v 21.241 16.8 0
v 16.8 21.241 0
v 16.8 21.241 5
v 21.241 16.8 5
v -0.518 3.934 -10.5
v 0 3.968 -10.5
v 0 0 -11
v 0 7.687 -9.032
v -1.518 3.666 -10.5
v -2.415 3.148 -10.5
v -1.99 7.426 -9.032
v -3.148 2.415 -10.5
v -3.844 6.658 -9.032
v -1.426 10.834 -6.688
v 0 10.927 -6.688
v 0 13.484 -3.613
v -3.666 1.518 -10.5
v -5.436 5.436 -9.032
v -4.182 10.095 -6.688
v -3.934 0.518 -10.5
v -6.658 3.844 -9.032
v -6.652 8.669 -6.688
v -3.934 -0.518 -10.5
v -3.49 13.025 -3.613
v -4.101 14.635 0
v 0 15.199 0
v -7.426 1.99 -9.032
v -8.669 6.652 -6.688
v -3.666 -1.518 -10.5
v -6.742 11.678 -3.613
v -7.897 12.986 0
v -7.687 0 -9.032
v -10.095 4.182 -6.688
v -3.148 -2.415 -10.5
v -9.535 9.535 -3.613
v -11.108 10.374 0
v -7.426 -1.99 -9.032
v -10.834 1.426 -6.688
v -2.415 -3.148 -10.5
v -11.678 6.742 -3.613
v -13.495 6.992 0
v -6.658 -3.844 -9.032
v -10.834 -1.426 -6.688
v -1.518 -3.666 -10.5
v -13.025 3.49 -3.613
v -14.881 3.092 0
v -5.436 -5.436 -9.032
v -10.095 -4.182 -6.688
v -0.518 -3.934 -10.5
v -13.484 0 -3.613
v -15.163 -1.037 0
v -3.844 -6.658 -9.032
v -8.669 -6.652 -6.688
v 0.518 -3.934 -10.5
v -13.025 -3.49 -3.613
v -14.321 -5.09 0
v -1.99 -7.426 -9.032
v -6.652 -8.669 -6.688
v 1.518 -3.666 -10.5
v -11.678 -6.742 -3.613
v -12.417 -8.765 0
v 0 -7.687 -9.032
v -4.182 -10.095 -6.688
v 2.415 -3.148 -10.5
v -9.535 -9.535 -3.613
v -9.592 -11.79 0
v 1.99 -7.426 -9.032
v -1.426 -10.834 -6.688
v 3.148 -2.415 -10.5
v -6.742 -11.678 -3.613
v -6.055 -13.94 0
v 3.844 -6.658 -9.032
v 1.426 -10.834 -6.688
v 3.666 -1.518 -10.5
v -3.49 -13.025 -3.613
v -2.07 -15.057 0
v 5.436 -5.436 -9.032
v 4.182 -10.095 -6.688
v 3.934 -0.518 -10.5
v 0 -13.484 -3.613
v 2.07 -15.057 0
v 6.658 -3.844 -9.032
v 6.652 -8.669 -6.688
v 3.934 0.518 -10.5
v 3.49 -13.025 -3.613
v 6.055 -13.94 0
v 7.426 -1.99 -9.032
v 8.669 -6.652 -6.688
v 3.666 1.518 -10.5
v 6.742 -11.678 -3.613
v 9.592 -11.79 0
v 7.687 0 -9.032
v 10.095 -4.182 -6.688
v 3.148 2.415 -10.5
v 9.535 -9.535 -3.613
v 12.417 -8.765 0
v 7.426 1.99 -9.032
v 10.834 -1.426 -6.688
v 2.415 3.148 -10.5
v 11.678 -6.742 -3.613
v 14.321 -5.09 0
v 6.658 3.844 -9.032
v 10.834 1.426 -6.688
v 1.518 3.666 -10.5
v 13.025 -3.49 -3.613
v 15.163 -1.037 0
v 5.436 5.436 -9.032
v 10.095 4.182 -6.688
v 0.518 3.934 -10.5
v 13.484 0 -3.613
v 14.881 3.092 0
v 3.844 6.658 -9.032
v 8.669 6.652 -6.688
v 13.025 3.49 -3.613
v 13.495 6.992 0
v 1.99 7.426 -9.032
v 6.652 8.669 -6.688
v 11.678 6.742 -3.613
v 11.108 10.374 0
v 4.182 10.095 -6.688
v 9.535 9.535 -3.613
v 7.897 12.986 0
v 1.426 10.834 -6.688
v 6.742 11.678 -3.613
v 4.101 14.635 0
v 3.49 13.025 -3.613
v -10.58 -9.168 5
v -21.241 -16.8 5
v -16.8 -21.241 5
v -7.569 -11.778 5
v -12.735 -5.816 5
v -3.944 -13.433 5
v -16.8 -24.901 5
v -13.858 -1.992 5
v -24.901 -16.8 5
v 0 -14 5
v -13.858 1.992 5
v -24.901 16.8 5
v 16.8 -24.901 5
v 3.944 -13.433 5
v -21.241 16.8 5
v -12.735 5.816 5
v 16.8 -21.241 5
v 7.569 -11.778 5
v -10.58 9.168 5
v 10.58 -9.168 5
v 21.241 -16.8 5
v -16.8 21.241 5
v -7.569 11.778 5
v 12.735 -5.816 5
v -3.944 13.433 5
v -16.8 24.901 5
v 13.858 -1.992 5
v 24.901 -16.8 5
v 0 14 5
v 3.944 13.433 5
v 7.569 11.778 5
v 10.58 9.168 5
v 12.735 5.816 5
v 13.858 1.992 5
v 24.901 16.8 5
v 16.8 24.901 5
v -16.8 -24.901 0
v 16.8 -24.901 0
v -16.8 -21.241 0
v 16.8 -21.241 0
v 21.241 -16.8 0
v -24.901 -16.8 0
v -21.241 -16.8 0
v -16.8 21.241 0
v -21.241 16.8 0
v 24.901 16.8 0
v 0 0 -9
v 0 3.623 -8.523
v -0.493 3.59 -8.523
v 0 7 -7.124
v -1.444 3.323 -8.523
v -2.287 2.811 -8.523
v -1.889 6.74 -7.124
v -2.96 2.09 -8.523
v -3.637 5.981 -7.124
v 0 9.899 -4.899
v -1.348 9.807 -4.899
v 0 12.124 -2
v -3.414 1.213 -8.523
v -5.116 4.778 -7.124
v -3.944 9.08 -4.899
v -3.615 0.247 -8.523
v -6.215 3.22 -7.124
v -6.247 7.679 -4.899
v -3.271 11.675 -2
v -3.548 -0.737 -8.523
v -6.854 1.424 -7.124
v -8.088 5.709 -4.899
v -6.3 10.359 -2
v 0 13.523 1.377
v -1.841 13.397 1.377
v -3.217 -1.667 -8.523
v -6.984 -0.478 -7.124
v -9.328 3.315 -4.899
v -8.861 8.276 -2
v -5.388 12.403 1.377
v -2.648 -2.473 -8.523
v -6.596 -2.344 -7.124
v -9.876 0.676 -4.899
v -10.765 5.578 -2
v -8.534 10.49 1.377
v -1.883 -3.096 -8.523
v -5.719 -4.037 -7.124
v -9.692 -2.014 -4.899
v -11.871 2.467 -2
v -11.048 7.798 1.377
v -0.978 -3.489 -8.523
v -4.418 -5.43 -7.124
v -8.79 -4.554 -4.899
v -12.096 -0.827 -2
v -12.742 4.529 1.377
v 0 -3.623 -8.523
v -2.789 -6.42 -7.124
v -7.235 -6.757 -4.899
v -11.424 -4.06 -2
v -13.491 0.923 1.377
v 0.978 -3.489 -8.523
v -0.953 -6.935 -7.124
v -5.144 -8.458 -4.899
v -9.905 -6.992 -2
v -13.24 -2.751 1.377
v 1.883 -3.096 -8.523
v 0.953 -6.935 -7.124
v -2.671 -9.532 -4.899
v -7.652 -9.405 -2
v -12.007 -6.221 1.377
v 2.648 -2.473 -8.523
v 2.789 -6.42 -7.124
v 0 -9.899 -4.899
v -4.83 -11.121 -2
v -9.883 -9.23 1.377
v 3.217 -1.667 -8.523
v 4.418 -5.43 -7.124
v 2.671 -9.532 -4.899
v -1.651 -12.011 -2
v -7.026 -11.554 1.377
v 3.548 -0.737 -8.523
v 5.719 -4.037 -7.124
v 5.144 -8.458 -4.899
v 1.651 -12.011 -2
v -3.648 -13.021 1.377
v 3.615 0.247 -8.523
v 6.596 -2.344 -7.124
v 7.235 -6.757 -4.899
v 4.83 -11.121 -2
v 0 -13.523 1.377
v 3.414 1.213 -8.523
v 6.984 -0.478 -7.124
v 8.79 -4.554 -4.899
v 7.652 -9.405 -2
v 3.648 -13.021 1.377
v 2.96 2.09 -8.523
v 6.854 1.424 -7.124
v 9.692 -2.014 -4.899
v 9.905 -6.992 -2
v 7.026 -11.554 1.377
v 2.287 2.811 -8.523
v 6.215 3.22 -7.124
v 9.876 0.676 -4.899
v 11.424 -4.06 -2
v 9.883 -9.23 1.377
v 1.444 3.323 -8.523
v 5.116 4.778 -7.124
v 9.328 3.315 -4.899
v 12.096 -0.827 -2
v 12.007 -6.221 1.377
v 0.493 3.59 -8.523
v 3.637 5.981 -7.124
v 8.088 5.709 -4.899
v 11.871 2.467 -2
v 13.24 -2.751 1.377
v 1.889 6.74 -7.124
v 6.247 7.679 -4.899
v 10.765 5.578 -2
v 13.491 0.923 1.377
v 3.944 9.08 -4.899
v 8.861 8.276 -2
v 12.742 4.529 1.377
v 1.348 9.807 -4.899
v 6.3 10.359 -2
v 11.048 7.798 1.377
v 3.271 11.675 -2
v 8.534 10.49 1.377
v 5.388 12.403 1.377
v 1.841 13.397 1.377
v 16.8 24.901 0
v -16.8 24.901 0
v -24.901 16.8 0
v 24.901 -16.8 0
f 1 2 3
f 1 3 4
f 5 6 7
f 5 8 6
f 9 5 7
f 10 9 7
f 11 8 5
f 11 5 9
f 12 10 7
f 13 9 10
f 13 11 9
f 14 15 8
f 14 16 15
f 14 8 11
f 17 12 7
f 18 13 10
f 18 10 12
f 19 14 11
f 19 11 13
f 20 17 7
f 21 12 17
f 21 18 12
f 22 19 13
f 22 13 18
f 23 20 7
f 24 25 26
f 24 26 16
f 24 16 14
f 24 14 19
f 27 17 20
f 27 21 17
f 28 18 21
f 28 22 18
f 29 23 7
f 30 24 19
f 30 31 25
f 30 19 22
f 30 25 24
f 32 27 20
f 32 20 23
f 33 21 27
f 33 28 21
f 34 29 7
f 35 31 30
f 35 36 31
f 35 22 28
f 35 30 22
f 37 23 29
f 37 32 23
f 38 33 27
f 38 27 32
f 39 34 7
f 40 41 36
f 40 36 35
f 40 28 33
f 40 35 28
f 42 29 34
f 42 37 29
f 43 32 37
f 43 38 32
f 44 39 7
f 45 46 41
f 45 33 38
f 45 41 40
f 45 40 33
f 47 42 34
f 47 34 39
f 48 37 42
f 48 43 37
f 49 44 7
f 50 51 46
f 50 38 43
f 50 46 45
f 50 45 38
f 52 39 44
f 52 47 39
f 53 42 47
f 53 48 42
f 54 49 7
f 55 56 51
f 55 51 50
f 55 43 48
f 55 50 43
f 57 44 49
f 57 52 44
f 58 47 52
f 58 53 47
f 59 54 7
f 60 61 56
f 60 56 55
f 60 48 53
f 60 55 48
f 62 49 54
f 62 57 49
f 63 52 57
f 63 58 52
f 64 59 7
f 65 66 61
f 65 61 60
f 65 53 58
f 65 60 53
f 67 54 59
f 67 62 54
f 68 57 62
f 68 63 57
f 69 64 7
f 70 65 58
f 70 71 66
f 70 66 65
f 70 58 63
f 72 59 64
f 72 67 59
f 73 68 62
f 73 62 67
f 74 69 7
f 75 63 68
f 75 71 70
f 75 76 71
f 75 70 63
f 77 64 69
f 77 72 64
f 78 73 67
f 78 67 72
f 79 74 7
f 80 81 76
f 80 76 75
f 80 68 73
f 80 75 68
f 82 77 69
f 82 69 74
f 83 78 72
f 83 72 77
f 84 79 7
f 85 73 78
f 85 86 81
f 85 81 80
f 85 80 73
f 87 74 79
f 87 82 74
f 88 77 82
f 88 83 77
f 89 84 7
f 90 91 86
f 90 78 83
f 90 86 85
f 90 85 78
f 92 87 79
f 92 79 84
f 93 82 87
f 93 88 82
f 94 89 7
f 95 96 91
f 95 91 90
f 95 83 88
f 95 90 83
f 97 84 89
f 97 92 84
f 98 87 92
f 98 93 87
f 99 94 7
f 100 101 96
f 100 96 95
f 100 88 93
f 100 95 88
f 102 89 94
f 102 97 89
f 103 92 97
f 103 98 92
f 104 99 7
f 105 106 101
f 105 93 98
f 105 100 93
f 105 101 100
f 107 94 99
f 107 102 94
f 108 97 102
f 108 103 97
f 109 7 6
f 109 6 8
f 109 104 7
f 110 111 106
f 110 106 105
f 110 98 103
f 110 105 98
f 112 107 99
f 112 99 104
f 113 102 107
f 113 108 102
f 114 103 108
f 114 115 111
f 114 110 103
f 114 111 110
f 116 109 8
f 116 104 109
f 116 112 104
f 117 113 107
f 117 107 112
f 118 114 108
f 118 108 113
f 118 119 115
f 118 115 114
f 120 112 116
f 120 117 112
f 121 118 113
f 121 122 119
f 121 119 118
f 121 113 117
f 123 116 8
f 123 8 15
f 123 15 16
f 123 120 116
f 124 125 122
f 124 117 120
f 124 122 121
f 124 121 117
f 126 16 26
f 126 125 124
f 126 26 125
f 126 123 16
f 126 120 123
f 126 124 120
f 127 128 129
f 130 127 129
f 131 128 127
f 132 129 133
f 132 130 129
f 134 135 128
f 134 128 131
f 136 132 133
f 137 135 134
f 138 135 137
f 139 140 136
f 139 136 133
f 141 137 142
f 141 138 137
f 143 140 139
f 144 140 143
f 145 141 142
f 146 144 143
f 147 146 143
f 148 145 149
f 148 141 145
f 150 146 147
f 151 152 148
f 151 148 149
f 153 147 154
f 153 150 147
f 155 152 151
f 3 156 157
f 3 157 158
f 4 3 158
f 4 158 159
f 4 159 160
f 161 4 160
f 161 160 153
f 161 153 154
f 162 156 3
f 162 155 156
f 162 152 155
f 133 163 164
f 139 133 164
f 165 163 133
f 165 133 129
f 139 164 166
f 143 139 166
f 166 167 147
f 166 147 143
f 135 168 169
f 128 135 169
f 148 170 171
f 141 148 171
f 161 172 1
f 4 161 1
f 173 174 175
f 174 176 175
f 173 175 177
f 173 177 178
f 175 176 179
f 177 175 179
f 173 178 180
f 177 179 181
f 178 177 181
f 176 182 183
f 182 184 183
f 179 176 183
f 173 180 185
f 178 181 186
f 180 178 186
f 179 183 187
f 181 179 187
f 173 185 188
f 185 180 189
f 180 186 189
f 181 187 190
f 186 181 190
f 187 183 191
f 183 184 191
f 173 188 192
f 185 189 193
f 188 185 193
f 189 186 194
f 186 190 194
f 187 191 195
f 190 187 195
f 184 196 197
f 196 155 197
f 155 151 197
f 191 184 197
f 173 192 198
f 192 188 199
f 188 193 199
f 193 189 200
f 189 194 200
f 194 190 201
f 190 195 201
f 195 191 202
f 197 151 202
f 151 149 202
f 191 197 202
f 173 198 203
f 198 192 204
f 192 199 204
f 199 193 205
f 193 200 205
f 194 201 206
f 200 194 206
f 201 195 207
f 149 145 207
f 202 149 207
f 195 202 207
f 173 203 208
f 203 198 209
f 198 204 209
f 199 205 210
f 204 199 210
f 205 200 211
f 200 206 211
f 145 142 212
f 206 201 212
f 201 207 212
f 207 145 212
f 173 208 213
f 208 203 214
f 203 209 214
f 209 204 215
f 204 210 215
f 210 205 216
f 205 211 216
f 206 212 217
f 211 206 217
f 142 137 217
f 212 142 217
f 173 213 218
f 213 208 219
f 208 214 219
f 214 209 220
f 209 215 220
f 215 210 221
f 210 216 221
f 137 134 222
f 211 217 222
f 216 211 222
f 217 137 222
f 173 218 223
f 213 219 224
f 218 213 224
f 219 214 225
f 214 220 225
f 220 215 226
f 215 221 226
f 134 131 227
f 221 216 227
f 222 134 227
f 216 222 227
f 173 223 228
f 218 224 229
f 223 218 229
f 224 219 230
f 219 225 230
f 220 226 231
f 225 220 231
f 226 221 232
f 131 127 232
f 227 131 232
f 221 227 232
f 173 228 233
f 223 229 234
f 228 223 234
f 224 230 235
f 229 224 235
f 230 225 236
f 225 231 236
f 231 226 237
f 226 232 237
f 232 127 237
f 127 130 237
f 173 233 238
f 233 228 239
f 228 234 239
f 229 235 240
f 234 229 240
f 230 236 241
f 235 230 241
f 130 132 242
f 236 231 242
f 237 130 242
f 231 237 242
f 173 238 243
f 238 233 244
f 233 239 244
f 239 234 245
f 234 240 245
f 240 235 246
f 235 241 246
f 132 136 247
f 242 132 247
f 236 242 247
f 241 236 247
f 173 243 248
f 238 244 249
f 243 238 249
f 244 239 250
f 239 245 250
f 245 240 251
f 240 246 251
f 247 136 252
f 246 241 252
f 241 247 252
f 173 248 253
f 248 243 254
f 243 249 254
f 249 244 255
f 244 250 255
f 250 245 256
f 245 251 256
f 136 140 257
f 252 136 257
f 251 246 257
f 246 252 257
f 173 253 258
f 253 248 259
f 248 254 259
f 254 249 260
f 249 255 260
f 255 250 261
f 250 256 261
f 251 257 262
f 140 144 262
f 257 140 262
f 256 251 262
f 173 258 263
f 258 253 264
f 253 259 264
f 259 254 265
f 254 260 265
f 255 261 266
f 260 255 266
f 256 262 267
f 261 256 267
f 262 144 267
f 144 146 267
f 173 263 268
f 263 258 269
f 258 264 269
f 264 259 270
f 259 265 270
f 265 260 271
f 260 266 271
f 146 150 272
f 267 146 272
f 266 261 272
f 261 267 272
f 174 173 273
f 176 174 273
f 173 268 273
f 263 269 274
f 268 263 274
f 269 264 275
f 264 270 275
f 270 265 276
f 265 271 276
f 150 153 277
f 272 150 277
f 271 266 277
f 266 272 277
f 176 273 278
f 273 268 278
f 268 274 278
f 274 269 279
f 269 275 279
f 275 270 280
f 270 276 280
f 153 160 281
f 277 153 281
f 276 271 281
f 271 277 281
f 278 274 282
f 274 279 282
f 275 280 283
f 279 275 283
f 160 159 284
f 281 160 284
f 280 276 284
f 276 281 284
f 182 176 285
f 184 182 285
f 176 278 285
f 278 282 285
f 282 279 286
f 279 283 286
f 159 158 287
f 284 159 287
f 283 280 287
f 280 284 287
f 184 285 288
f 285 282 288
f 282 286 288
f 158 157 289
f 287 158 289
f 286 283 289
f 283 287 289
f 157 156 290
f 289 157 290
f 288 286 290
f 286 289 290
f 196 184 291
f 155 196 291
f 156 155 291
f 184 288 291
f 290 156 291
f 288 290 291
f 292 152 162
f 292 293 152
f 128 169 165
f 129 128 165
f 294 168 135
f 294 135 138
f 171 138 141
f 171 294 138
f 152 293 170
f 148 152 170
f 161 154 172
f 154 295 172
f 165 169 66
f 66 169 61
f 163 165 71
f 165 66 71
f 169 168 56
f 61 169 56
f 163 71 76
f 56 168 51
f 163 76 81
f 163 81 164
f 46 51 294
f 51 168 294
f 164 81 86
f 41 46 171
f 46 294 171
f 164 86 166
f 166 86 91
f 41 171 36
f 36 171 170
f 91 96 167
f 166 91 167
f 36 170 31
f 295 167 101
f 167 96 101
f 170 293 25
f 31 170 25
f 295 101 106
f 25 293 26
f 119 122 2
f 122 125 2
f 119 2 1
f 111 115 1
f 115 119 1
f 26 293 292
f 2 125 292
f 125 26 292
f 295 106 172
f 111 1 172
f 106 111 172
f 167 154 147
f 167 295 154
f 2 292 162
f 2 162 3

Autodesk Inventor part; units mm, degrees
ref_plane "YZ Plane" through (0, 0, 0) normal (1, 0, 0) x (0, 1, 0)
ref_plane "XZ Plane" through (0, 0, 0) normal (0, 1, 0) x (-1, 0, 0)
ref_plane "XY Plane" through (0, 0, 0) normal (0, 0, 1) x (1, 0, 0)
sketch "Sketch1" plane through (0, 0, 0) normal (0, 0, 1) x (1, 0, 0)
  line L0 (-38.8739, 0) -> (58.9391, 0) construction
  line L1 (0, -36.2399) -> (0, 43.1348) construction
  line L2 (0, 0) -> (31.7956, 31.7956) construction
  line L3 (0, 0) -> (44.9658, 0) construction
  line L4 (0, 24.9006) -> (16.8, 24.9006)
  line L5 (16.8, 24.9006) -> (16.8, 21.2406)
  line L6 (16.8, 21.2406) -> (19.0203, 19.0203)
  line L7 (24.9006, 0) -> (24.9006, 16.8)
  line L8 (24.9006, 16.8) -> (21.2406, 16.8)
  line L9 (21.2406, 16.8) -> (19.0203, 19.0203)
  line L10 (0, 24.9006) -> (-16.8, 24.9006)
  line L11 (-16.8, 24.9006) -> (-16.8, 21.2406)
  line L12 (-16.8, 21.2406) -> (-19.0203, 19.0203)
  line L13 (-24.9006, 0) -> (-24.9006, 16.8)
  line L14 (-24.9006, 16.8) -> (-21.2406, 16.8)
  line L15 (-21.2406, 16.8) -> (-19.0203, 19.0203)
  line L16 (0, -24.9006) -> (16.8, -24.9006)
  line L17 (16.8, -24.9006) -> (16.8, -21.2406)
  line L18 (16.8, -21.2406) -> (19.0203, -19.0203)
  line L19 (24.9006, 0) -> (24.9006, -16.8)
  line L20 (24.9006, -16.8) -> (21.2406, -16.8)
  line L21 (21.2406, -16.8) -> (19.0203, -19.0203)
  line L22 (0, -24.9006) -> (-16.8, -24.9006)
  line L23 (-16.8, -24.9006) -> (-16.8, -21.2406)
  line L24 (-16.8, -21.2406) -> (-19.0203, -19.0203)
  line L25 (-24.9006, 0) -> (-24.9006, -16.8)
  line L26 (-24.9006, -16.8) -> (-21.2406, -16.8)
  line L27 (-21.2406, -16.8) -> (-19.0203, -19.0203)
  circle A0 centre (0, 0) radius 14
  dimension "d0" = 45
  dimension "d1" = 16.8
  dimension "d2" = 3.66
  dimension "d3" = 3.14
  dimension "d4" = 28
extrude "Extrusion1" add sketch "Sketch1" along normal blind 5
sketch "Sketch2" plane through (0, 0, 5) normal (0, 0, 1) x (1, 0, 0)
  circle A0 centre (0, 0) radius 14 construction
  line L0 (16.8, 24.9006) -> (-16.8, 24.9006) construction
  line L1 (-16.8, 24.9006) -> (-16.8, 21.2406) construction
  line L2 (-16.8, 21.2406) -> (-21.2406, 16.8) construction
  line L3 (-21.2406, 16.8) -> (-24.9006, 16.8) construction
  line L4 (-24.9006, 16.8) -> (-24.9006, -16.8) construction
  line L5 (-24.9006, -16.8) -> (-21.2406, -16.8) construction
  line L6 (-21.2406, -16.8) -> (-16.8, -21.2406) construction
  line L7 (-16.8, -21.2406) -> (-16.8, -24.9006) construction
  line L8 (-16.8, -24.9006) -> (16.8, -24.9006) construction
  line L9 (16.8, -24.9006) -> (16.8, -21.2406) construction
  line L10 (16.8, -21.2406) -> (21.2406, -16.8) construction
  line L11 (21.2406, -16.8) -> (24.9006, -16.8) construction
  line L12 (24.9006, -16.8) -> (24.9006, 16.8) construction
  line L13 (24.9006, 16.8) -> (21.2406, 16.8) construction
  line L14 (21.2406, 16.8) -> (16.8, 21.2406) construction
  line L15 (16.8, 21.2406) -> (16.8, 24.9006) construction
  line L16 (-34.8609, 0) -> (34.8609, 0) construction
  line L17 (0, -34.8609) -> (0, 34.8609) construction
  circle A1 centre (13, -13) radius 2.5
  circle A2 centre (-13, -13) radius 2.5
  dimension "d7" = 5
  dimension "d8" = 13
  dimension "d9" = 13
extrude "Extrusion2" [suppressed]
sketch "Sketch3" plane through (0, 0, 0) normal (1, 0, 0) x (0, 1, 0)
  line L0 (-14, 5) -> (14, 5) construction
  line L1 (24.9006, 5) -> (21.2406, 5) construction
  line L2 (21.2406, 5) -> (16.8, 5) construction
  line L3 (16.8, 5) -> (-16.8, 5) construction
  line L4 (-16.8, 5) -> (-21.2406, 5) construction
  line L5 (-21.2406, 5) -> (-24.9006, 5) construction
  line L6 (-24.9006, 5) -> (-21.2406, 5) construction
  line L7 (-21.2406, 5) -> (-16.8, 5) construction
  line L8 (-16.8, 5) -> (16.8, 5) construction
  line L9 (16.8, 5) -> (21.2406, 5) construction
  line L10 (21.2406, 5) -> (24.9006, 5) construction
  line L11 (24.9006, 0) -> (21.2406, 0) construction
  line L12 (24.9006, 0) -> (24.9006, 5) construction
  line L13 (21.2406, 5) -> (24.9006, 5) construction
  line L14 (21.2406, 0) -> (21.2406, 5) construction
  line L15 (21.2406, 0) -> (16.8, 0) construction
  line L16 (21.2406, 0) -> (21.2406, 5) construction
  line L17 (16.8, 5) -> (21.2406, 5) construction
  line L18 (16.8, 0) -> (16.8, 5) construction
  line L19 (16.8, 0) -> (-16.8, 0) construction
  line L20 (16.8, 0) -> (16.8, 5) construction
  line L21 (-16.8, 5) -> (16.8, 5) construction
  line L22 (-16.8, 0) -> (-16.8, 5) construction
  line L23 (-16.8, 0) -> (-21.2406, 0) construction
  line L24 (-16.8, 0) -> (-16.8, 5) construction
  line L25 (-21.2406, 5) -> (-16.8, 5) construction
  line L26 (-21.2406, 0) -> (-21.2406, 5) construction
  line L27 (-21.2406, 0) -> (-24.9006, 0) construction
  line L28 (-21.2406, 0) -> (-21.2406, 5) construction
  line L29 (-24.9006, 5) -> (-21.2406, 5) construction
  line L30 (-24.9006, 0) -> (-24.9006, 5) construction
  line L31 (-14, 5) -> (14, 5) construction
  line L32 (14, 0) -> (-14, 0) construction
  line L33 (16.8, 5) -> (-16.8, 5)
  arc A0 (0, -9) -> (14, 5) centre (0, 5) ccw
  line L34 (0, -16.0037) -> (0, 8.5006) construction
  arc A1 (0, -11) -> (16, 5) centre (0, 5) ccw
  line L35 (0, -9) -> (0, -11)
  line L36 (16, 5) -> (14, 5)
revolve "Revolution1" add sketch "Sketch3" angle 360 about axis through (0, 0, -10) along (0, 0, 1)
equation "\"d9\" = d8"
properties part number "20_Cube_Insert_Eye"
